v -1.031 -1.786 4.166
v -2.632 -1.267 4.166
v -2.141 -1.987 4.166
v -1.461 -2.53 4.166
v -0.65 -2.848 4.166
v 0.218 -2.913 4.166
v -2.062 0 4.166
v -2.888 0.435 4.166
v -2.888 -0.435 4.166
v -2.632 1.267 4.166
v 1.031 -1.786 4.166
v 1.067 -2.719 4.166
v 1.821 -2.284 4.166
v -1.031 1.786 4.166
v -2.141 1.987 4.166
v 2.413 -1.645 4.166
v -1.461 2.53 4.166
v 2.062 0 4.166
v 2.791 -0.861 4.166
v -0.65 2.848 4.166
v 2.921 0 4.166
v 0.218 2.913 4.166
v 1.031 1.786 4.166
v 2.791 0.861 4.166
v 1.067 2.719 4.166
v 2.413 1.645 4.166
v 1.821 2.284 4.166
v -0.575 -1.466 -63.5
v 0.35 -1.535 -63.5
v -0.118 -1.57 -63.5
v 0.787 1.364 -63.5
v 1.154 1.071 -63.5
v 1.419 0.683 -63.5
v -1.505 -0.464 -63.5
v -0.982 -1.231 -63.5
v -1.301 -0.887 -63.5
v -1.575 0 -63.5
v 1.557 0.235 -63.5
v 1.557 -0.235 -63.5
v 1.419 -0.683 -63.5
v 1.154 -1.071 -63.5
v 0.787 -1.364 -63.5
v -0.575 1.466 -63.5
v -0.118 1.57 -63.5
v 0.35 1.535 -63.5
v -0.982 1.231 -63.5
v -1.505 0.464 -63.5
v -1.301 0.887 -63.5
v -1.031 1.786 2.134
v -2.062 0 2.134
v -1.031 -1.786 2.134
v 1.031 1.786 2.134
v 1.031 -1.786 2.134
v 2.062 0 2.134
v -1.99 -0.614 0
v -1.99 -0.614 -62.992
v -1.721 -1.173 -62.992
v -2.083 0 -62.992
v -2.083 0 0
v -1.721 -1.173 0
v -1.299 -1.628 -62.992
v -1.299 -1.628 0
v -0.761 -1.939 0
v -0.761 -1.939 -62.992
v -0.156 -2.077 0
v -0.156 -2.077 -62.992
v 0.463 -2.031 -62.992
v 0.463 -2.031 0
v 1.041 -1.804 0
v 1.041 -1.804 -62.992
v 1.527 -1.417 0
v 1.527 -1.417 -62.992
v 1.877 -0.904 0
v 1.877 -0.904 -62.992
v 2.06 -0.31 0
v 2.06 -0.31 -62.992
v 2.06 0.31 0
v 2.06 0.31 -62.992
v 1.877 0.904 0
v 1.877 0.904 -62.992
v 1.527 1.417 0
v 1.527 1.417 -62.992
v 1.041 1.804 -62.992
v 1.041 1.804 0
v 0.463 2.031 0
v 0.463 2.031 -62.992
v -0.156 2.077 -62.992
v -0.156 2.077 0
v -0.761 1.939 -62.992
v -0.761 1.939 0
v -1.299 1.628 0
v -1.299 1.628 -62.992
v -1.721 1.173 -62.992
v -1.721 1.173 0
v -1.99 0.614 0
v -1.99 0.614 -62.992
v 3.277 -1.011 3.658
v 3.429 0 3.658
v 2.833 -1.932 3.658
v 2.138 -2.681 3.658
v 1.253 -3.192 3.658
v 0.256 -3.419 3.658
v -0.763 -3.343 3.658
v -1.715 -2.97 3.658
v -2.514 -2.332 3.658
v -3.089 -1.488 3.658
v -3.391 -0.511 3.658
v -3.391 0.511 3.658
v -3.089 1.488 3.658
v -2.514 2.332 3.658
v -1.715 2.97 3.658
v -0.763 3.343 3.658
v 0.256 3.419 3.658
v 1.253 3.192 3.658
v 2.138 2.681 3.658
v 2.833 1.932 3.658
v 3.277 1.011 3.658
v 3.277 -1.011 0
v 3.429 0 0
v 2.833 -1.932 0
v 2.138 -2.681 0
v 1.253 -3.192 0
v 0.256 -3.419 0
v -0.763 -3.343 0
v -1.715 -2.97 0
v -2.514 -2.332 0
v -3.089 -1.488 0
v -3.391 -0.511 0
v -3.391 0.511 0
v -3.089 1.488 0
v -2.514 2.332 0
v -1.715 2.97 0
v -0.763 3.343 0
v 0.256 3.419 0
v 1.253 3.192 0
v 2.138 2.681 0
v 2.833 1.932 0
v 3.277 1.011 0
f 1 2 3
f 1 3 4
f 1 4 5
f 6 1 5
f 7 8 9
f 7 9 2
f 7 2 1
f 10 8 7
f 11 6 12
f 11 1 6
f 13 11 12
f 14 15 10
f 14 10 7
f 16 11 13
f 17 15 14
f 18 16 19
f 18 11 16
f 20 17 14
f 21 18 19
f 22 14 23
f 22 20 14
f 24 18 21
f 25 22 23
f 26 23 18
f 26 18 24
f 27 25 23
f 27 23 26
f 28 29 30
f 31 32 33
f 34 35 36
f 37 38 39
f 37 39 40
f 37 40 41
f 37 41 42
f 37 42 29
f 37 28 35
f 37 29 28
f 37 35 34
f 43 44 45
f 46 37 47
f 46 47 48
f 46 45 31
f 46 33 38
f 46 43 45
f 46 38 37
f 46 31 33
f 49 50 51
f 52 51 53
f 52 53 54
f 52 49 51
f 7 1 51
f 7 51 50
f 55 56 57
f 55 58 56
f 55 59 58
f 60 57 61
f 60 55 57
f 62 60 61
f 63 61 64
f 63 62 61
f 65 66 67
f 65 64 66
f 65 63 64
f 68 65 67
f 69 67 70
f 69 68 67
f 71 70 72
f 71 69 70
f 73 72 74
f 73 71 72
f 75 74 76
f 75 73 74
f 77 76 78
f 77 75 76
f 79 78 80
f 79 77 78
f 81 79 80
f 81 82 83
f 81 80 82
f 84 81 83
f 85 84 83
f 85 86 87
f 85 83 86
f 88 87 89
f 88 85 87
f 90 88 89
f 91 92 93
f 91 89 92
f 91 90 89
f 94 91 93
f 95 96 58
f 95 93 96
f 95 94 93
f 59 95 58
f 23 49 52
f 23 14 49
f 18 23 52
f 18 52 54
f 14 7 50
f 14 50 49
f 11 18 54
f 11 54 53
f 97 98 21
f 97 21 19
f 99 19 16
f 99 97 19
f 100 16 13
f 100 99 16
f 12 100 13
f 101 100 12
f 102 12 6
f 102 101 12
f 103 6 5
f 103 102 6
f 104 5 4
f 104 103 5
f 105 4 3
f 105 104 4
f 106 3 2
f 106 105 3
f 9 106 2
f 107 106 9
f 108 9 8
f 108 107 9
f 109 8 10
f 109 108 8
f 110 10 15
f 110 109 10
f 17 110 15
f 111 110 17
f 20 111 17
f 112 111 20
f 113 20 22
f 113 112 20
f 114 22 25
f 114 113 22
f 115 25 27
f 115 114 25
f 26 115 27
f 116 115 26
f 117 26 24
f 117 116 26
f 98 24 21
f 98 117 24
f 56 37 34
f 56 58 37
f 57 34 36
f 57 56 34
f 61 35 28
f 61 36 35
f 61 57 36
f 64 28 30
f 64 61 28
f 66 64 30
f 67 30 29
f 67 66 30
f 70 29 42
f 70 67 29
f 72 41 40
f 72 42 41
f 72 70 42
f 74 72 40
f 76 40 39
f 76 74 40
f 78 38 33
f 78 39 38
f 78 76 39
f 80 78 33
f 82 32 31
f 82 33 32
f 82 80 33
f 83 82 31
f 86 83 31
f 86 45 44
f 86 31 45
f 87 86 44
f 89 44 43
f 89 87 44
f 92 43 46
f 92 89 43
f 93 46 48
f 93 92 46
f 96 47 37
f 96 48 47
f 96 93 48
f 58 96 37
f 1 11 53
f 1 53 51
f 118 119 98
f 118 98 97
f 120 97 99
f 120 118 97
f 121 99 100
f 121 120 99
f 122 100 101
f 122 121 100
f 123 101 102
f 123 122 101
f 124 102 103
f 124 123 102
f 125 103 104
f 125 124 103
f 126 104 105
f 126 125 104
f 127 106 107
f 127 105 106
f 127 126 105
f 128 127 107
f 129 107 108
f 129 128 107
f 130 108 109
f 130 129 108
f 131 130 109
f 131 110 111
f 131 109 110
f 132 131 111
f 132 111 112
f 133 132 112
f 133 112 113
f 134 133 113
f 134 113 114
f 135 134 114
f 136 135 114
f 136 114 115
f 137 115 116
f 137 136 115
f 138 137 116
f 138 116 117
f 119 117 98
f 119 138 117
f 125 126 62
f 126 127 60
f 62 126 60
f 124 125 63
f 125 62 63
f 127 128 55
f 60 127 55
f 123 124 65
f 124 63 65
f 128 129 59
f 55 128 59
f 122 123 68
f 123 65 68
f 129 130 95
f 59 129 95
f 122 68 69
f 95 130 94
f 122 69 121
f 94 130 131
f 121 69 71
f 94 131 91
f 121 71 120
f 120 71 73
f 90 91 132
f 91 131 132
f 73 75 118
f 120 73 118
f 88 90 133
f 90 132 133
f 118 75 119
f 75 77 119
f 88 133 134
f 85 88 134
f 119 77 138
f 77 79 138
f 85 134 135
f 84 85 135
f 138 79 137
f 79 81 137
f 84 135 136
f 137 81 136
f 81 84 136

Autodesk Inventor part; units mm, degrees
ref_plane "YZ Plane" through (0, 0, 0) normal (1, 0, 0) x (0, 1, 0)
ref_plane "XZ Plane" through (0, 0, 0) normal (0, 1, 0) x (-1, 0, 0)
ref_plane "XY Plane" through (0, 0, 0) normal (0, 0, 1) x (1, 0, 0)
sketch "Sketch1" plane through (0, 0, 0) normal (0, 0, 1) x (1, 0, 0)
  circle A0 centre (0, 0) radius 3.429
  dimension "d0" = 6.858
extrude "Extrusion1" add sketch "Sketch1" along normal blind 4.1656
sketch "Sketch2" plane through (0, 0, 0) normal (0, 0, -1) x (-1, 0, 0)
  circle A0 centre (0, 0) radius 3.429 projected
  circle A1 centre (0, 0) radius 2.0828
  dimension "d3" = 4.1656
extrude "Extrusion2" add sketch "Sketch2" along normal blind 63.5 contours A1
sketch "Sketch3" plane through (0, 0, 4.1656) normal (0, 0, 1) x (1, 0, 0)
  circle A0 centre (0, 0) radius 3.429 projected
  line L0 (-1.0311, 1.7859) -> (1.0311, 1.7859)
  line L1 (1.0311, 1.7859) -> (2.0622, 0)
  line L2 (2.0622, 0) -> (1.0311, -1.7859)
  line L3 (1.0311, -1.7859) -> (-1.0311, -1.7859)
  line L4 (-1.0311, -1.7859) -> (-2.0622, 0)
  line L5 (-2.0622, 0) -> (-1.0311, 1.7859)
  dimension "d6" = 3.5719
extrude "Extrusion3" cut sketch "Sketch3" against normal blind 2.032 contours L0 L1 L2 L3 L4 L5
thread "Thread1" size "8-32 UNC" class "2A" standard "ANSI Unified Screw Threads" length 25.4
chamfer "Chamfer1" distance 0.508 angle 45 1 edges at (2.0828, 0, -63.5)
chamfer "Chamfer2" distance 0.508 angle 45 1 edges at (-3.429, 0, 4.1656)
properties part number "10-32 x1000" material "Steel"
